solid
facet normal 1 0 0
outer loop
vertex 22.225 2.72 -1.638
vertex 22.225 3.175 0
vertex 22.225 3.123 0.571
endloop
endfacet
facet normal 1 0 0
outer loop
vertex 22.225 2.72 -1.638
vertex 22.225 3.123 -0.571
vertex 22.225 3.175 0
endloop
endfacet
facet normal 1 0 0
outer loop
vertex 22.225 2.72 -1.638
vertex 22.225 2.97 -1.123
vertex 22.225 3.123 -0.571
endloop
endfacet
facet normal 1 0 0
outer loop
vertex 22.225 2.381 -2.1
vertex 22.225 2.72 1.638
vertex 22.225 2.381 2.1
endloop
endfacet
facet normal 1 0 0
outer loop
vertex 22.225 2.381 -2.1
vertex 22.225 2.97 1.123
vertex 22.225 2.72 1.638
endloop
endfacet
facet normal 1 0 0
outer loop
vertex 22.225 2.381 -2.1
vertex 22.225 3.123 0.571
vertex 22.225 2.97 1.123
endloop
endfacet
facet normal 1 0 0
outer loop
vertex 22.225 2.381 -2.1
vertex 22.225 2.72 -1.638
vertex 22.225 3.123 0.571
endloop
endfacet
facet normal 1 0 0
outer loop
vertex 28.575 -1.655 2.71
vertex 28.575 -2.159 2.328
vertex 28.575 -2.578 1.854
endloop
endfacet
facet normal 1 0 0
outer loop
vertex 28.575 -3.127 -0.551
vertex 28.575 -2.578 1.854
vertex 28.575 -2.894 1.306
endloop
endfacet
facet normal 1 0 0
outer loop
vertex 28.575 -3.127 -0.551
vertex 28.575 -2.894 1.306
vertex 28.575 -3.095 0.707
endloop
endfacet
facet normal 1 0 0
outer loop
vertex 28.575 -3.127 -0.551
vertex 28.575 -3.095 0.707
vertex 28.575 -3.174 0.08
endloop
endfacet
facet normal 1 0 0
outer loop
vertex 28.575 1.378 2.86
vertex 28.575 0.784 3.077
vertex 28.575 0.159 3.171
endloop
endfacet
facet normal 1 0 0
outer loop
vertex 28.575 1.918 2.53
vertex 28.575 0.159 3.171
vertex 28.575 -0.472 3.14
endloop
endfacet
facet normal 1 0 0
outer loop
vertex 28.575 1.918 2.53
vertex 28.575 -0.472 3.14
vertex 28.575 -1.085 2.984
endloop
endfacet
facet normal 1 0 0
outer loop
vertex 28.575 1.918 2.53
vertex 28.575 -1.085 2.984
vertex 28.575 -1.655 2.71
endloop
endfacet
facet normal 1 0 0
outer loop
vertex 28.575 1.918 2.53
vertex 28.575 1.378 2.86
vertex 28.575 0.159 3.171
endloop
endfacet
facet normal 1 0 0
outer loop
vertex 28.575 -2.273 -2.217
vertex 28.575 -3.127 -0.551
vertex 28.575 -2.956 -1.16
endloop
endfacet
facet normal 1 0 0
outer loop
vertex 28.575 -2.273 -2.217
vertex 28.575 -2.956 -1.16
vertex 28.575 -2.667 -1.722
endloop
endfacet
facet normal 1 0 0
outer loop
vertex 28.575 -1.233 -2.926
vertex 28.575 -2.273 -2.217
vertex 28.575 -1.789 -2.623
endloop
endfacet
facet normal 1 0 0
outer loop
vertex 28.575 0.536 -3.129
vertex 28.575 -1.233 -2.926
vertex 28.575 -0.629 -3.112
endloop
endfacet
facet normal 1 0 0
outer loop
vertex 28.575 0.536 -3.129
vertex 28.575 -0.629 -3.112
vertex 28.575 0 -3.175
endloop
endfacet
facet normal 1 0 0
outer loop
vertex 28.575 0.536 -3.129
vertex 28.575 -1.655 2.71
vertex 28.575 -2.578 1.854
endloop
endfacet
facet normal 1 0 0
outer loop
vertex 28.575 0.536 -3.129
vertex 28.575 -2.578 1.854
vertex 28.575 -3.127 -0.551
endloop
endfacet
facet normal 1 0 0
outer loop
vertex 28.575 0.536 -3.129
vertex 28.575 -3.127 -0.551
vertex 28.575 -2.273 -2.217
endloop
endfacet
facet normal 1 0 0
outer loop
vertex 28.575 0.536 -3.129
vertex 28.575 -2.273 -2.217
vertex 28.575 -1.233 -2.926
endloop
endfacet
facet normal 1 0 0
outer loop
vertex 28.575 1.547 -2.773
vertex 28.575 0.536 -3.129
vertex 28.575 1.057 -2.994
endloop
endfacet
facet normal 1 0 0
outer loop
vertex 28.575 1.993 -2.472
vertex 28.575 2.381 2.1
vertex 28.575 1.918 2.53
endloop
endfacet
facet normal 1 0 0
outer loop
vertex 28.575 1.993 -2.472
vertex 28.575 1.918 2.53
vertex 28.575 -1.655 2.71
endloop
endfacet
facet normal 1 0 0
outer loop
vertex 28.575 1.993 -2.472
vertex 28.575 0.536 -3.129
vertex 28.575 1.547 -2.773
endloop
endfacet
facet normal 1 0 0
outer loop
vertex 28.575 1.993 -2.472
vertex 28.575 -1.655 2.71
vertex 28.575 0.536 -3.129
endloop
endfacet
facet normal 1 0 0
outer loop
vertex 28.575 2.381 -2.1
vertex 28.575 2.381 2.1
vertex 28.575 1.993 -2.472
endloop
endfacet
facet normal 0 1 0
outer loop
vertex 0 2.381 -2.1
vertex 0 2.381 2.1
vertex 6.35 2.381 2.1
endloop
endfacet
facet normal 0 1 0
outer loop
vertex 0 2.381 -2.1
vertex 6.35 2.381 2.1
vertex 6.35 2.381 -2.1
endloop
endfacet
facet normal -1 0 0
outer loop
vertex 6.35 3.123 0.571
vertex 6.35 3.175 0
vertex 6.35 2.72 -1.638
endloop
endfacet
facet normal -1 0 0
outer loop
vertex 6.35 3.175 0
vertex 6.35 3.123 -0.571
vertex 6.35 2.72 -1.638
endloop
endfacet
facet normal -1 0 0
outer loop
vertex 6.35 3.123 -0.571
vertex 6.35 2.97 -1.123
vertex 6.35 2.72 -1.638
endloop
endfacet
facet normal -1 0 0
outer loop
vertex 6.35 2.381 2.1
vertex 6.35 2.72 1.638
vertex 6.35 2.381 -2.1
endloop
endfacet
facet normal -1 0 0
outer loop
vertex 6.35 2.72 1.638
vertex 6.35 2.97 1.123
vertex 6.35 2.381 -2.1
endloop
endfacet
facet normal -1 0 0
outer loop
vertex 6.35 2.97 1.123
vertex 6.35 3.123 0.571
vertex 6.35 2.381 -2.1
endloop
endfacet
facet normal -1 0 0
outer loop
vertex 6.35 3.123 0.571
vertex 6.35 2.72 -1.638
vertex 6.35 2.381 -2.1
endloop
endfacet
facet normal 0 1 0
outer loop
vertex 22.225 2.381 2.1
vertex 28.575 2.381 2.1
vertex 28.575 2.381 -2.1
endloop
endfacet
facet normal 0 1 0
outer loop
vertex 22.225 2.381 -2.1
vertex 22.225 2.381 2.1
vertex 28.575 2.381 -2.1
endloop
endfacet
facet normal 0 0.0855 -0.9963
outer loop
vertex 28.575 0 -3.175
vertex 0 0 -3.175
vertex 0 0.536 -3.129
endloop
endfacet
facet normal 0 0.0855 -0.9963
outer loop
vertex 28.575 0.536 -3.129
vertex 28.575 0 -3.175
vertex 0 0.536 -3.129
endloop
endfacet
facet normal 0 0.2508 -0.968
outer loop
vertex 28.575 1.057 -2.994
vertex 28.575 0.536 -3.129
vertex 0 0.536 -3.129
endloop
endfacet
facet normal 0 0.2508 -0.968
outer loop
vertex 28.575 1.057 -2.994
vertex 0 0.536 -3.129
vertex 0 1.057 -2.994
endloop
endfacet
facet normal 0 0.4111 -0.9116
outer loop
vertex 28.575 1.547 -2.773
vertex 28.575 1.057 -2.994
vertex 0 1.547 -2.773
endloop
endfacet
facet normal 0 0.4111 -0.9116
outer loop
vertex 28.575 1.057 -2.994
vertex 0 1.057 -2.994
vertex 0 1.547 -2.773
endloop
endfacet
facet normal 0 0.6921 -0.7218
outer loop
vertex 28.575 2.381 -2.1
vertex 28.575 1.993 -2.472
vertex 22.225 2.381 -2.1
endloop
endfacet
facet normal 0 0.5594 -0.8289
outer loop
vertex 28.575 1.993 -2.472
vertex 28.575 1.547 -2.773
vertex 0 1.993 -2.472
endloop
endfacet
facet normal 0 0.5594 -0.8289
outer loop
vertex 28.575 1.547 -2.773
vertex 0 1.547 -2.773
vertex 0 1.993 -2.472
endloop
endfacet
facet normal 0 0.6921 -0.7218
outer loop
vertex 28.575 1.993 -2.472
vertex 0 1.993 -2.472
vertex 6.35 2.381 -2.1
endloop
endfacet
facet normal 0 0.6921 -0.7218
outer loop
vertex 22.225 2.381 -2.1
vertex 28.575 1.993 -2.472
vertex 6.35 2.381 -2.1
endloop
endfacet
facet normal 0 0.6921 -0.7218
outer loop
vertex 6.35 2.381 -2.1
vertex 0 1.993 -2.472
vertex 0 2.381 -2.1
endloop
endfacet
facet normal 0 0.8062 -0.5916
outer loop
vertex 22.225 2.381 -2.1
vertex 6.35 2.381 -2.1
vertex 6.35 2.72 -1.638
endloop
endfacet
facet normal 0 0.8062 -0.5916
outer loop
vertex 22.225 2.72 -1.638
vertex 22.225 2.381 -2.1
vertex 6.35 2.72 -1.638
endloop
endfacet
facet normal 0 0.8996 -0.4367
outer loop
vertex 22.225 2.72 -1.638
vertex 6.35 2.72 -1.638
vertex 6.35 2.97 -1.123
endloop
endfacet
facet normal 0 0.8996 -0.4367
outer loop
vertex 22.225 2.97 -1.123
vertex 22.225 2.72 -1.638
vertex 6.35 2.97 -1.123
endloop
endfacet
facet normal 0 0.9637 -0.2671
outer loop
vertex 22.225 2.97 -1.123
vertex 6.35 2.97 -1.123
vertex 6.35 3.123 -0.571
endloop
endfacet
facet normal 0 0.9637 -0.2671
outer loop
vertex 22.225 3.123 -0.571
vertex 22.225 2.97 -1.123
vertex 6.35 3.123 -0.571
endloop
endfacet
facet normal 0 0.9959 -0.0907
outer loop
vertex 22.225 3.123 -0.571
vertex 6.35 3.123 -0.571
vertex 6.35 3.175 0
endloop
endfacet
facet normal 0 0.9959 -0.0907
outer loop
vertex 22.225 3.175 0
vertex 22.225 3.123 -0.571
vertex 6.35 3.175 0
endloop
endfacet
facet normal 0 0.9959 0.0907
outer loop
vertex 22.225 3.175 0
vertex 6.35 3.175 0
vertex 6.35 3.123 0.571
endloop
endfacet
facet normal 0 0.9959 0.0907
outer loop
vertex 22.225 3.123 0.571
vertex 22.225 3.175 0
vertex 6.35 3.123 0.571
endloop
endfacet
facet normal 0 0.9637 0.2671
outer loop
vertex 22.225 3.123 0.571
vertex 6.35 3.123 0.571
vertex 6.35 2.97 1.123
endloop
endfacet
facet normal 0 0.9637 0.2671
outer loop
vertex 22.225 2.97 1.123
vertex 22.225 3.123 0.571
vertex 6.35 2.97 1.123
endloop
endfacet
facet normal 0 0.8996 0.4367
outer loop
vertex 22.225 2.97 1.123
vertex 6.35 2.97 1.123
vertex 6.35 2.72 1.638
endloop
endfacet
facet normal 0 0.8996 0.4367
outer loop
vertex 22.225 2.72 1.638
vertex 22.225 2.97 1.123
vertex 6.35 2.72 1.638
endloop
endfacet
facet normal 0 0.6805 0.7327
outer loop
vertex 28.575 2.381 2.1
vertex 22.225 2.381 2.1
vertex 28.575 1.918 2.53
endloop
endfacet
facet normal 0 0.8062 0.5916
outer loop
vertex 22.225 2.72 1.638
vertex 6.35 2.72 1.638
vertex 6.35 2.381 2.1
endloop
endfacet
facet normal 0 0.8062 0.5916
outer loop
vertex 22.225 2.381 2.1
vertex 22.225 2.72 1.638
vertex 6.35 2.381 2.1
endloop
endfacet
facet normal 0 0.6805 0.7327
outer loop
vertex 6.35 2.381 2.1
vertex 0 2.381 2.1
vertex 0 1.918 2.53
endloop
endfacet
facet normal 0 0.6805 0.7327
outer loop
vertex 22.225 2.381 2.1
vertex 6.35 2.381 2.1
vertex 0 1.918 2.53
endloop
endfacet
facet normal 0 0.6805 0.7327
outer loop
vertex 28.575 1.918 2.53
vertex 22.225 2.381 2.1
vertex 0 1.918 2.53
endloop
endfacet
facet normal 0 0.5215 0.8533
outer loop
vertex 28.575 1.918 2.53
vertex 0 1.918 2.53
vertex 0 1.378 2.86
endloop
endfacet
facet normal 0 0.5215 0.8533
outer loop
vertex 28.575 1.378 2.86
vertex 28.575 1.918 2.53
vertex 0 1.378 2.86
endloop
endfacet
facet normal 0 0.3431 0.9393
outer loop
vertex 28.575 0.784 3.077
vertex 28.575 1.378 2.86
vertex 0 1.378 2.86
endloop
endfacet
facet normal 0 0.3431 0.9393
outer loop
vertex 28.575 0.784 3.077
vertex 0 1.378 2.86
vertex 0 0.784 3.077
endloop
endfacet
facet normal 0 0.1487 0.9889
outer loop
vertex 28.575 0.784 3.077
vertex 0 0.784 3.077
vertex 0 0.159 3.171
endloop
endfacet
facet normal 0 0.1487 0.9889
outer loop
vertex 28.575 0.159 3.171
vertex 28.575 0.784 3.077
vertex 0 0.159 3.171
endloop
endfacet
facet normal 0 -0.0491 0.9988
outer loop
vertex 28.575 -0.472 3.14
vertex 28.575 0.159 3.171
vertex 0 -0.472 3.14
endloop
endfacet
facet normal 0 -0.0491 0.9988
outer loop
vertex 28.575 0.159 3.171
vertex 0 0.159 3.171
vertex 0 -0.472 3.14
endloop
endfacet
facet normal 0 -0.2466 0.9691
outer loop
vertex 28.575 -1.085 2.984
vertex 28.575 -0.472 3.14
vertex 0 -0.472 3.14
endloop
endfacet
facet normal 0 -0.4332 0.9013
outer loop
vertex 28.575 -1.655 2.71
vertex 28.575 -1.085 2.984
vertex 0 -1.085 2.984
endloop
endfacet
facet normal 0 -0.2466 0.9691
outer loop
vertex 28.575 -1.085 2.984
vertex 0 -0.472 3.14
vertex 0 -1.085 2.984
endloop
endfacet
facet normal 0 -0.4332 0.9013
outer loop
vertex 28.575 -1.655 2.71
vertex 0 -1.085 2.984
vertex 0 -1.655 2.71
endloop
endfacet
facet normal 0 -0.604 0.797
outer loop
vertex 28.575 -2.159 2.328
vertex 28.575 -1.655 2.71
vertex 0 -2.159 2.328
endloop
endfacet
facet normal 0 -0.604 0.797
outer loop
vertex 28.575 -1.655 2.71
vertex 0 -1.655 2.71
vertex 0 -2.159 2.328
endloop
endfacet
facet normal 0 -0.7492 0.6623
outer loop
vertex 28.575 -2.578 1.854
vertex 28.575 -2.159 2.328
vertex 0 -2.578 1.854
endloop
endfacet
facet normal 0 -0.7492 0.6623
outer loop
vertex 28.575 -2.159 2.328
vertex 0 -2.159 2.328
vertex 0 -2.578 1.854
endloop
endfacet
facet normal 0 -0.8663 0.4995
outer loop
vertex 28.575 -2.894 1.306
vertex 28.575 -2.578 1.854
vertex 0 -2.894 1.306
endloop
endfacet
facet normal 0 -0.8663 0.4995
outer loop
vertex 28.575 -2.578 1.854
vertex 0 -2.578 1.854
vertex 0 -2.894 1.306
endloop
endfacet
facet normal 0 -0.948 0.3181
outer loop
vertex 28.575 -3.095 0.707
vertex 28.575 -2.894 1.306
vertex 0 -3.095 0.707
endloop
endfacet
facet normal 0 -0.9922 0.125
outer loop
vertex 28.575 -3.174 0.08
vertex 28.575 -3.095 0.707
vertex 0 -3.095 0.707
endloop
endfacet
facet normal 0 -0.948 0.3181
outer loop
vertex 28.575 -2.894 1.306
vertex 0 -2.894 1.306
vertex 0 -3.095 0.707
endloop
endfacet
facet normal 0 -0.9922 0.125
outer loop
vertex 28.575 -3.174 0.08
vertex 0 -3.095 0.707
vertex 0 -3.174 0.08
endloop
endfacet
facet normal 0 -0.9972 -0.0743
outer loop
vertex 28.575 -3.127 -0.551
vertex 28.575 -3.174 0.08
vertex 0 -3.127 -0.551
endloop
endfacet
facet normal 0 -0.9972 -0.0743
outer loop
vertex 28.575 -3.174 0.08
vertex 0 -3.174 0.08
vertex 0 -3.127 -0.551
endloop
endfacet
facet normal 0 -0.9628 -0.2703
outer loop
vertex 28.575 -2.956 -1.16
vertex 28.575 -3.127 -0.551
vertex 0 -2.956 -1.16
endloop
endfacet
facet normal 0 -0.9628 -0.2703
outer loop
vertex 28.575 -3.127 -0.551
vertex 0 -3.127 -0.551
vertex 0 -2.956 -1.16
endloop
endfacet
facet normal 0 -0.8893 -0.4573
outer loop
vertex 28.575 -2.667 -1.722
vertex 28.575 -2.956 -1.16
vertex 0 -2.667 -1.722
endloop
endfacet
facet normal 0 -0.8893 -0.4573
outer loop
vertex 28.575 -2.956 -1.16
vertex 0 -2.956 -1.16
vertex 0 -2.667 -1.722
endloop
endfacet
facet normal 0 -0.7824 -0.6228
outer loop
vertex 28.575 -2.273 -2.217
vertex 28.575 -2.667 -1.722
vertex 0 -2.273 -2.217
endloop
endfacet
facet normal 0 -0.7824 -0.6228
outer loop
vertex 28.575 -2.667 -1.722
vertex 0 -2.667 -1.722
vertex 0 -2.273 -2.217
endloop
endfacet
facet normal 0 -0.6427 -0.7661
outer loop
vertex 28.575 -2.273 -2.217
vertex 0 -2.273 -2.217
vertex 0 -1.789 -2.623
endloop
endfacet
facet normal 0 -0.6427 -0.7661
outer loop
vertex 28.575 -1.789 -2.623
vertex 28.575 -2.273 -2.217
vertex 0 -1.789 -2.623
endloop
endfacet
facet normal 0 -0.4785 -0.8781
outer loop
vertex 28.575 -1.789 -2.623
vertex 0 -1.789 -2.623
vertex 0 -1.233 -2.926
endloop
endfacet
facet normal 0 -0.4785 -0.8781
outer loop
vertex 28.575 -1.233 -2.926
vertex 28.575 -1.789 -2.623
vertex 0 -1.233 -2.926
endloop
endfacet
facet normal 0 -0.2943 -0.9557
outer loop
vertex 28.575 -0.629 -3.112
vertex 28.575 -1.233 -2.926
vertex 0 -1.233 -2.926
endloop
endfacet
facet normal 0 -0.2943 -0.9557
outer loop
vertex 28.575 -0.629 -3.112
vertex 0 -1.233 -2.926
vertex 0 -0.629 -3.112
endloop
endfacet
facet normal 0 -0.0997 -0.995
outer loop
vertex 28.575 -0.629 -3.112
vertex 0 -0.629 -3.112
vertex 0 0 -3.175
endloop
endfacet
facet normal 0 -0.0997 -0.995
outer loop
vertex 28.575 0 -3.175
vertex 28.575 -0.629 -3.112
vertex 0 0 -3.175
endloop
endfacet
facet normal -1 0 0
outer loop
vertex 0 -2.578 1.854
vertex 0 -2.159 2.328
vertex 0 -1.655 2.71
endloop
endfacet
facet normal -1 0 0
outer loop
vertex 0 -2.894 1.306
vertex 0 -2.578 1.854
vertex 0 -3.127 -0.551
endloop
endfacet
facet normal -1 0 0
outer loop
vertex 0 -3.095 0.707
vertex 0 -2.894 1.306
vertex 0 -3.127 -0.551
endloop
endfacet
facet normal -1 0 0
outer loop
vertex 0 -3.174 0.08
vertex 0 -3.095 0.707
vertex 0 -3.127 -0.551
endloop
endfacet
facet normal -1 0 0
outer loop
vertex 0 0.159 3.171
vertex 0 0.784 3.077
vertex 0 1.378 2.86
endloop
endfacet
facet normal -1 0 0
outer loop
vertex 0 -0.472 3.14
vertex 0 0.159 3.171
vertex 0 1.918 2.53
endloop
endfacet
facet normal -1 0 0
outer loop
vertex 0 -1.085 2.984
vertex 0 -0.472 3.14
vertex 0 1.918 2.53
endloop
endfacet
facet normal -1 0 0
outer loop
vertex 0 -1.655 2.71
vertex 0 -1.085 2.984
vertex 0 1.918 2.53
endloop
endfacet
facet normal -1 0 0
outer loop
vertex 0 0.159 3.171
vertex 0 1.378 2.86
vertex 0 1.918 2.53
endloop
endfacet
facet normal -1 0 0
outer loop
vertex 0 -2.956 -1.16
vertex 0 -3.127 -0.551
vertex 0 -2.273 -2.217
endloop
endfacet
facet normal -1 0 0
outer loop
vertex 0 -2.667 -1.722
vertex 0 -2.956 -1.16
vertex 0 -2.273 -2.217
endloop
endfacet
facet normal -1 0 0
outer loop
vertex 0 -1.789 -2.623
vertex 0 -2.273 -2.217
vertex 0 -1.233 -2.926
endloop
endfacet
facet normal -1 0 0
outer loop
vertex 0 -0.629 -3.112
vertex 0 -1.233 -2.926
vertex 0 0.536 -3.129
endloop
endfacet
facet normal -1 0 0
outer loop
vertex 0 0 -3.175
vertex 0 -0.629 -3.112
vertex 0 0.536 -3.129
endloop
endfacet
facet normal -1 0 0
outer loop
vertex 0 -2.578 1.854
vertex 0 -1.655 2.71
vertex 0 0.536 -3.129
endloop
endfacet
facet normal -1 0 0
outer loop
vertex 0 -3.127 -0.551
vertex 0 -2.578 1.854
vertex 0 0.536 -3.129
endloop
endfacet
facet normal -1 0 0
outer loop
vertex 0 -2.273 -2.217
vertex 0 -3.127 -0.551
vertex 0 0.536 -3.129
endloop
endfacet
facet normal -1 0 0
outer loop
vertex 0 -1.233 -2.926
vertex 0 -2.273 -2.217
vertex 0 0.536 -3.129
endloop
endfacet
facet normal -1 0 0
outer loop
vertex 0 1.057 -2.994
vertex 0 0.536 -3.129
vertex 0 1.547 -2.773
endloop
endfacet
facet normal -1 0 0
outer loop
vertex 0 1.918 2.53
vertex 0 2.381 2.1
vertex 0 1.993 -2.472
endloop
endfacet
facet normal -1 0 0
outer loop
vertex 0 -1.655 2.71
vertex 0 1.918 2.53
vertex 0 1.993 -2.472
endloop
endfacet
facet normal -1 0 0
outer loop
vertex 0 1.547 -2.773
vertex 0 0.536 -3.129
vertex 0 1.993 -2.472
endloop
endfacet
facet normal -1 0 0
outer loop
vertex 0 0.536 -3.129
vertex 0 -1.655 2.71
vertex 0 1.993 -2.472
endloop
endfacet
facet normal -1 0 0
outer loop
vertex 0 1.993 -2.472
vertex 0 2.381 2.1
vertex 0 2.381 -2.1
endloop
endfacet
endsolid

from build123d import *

# Parameters (mm, degrees)
SKETCH1_R           = 3.175
BOSS_EXTRUDE1_DEPTH = 28.575
SKETCH2_W           = 9.525
SKETCH2_H           = 1.5875
CUT_EXTRUDE1_DEPTH  = 6.35


with BuildPart() as part:
    # Sketch1 → Boss-Extrude1 (new body)
    with BuildSketch(Plane(origin=(0, 0, 0), x_dir=(0, 0, -1), z_dir=(1, 0, 0))):
        Circle(SKETCH1_R)
    extrude(amount=BOSS_EXTRUDE1_DEPTH)

    # Sketch2 → Cut-Extrude1 (cut)
    with BuildSketch(Plane(origin=(28.575, 0, 0), x_dir=(0, 0, -1), z_dir=(1, 0, 0))):
        with Locations((0, 3.175)):
            Rectangle(SKETCH2_W, SKETCH2_H)
    cut_extrude1 = extrude(amount=-CUT_EXTRUDE1_DEPTH, mode=Mode.SUBTRACT)

    # Mirror1: Cut-Extrude1 across plane
    add(cut_extrude1.mirror(Plane(origin=(14.2875, 0, 0), x_dir=(0, 0, 1), z_dir=(1, 0, 0))), mode=Mode.SUBTRACT)


solid = part.part
